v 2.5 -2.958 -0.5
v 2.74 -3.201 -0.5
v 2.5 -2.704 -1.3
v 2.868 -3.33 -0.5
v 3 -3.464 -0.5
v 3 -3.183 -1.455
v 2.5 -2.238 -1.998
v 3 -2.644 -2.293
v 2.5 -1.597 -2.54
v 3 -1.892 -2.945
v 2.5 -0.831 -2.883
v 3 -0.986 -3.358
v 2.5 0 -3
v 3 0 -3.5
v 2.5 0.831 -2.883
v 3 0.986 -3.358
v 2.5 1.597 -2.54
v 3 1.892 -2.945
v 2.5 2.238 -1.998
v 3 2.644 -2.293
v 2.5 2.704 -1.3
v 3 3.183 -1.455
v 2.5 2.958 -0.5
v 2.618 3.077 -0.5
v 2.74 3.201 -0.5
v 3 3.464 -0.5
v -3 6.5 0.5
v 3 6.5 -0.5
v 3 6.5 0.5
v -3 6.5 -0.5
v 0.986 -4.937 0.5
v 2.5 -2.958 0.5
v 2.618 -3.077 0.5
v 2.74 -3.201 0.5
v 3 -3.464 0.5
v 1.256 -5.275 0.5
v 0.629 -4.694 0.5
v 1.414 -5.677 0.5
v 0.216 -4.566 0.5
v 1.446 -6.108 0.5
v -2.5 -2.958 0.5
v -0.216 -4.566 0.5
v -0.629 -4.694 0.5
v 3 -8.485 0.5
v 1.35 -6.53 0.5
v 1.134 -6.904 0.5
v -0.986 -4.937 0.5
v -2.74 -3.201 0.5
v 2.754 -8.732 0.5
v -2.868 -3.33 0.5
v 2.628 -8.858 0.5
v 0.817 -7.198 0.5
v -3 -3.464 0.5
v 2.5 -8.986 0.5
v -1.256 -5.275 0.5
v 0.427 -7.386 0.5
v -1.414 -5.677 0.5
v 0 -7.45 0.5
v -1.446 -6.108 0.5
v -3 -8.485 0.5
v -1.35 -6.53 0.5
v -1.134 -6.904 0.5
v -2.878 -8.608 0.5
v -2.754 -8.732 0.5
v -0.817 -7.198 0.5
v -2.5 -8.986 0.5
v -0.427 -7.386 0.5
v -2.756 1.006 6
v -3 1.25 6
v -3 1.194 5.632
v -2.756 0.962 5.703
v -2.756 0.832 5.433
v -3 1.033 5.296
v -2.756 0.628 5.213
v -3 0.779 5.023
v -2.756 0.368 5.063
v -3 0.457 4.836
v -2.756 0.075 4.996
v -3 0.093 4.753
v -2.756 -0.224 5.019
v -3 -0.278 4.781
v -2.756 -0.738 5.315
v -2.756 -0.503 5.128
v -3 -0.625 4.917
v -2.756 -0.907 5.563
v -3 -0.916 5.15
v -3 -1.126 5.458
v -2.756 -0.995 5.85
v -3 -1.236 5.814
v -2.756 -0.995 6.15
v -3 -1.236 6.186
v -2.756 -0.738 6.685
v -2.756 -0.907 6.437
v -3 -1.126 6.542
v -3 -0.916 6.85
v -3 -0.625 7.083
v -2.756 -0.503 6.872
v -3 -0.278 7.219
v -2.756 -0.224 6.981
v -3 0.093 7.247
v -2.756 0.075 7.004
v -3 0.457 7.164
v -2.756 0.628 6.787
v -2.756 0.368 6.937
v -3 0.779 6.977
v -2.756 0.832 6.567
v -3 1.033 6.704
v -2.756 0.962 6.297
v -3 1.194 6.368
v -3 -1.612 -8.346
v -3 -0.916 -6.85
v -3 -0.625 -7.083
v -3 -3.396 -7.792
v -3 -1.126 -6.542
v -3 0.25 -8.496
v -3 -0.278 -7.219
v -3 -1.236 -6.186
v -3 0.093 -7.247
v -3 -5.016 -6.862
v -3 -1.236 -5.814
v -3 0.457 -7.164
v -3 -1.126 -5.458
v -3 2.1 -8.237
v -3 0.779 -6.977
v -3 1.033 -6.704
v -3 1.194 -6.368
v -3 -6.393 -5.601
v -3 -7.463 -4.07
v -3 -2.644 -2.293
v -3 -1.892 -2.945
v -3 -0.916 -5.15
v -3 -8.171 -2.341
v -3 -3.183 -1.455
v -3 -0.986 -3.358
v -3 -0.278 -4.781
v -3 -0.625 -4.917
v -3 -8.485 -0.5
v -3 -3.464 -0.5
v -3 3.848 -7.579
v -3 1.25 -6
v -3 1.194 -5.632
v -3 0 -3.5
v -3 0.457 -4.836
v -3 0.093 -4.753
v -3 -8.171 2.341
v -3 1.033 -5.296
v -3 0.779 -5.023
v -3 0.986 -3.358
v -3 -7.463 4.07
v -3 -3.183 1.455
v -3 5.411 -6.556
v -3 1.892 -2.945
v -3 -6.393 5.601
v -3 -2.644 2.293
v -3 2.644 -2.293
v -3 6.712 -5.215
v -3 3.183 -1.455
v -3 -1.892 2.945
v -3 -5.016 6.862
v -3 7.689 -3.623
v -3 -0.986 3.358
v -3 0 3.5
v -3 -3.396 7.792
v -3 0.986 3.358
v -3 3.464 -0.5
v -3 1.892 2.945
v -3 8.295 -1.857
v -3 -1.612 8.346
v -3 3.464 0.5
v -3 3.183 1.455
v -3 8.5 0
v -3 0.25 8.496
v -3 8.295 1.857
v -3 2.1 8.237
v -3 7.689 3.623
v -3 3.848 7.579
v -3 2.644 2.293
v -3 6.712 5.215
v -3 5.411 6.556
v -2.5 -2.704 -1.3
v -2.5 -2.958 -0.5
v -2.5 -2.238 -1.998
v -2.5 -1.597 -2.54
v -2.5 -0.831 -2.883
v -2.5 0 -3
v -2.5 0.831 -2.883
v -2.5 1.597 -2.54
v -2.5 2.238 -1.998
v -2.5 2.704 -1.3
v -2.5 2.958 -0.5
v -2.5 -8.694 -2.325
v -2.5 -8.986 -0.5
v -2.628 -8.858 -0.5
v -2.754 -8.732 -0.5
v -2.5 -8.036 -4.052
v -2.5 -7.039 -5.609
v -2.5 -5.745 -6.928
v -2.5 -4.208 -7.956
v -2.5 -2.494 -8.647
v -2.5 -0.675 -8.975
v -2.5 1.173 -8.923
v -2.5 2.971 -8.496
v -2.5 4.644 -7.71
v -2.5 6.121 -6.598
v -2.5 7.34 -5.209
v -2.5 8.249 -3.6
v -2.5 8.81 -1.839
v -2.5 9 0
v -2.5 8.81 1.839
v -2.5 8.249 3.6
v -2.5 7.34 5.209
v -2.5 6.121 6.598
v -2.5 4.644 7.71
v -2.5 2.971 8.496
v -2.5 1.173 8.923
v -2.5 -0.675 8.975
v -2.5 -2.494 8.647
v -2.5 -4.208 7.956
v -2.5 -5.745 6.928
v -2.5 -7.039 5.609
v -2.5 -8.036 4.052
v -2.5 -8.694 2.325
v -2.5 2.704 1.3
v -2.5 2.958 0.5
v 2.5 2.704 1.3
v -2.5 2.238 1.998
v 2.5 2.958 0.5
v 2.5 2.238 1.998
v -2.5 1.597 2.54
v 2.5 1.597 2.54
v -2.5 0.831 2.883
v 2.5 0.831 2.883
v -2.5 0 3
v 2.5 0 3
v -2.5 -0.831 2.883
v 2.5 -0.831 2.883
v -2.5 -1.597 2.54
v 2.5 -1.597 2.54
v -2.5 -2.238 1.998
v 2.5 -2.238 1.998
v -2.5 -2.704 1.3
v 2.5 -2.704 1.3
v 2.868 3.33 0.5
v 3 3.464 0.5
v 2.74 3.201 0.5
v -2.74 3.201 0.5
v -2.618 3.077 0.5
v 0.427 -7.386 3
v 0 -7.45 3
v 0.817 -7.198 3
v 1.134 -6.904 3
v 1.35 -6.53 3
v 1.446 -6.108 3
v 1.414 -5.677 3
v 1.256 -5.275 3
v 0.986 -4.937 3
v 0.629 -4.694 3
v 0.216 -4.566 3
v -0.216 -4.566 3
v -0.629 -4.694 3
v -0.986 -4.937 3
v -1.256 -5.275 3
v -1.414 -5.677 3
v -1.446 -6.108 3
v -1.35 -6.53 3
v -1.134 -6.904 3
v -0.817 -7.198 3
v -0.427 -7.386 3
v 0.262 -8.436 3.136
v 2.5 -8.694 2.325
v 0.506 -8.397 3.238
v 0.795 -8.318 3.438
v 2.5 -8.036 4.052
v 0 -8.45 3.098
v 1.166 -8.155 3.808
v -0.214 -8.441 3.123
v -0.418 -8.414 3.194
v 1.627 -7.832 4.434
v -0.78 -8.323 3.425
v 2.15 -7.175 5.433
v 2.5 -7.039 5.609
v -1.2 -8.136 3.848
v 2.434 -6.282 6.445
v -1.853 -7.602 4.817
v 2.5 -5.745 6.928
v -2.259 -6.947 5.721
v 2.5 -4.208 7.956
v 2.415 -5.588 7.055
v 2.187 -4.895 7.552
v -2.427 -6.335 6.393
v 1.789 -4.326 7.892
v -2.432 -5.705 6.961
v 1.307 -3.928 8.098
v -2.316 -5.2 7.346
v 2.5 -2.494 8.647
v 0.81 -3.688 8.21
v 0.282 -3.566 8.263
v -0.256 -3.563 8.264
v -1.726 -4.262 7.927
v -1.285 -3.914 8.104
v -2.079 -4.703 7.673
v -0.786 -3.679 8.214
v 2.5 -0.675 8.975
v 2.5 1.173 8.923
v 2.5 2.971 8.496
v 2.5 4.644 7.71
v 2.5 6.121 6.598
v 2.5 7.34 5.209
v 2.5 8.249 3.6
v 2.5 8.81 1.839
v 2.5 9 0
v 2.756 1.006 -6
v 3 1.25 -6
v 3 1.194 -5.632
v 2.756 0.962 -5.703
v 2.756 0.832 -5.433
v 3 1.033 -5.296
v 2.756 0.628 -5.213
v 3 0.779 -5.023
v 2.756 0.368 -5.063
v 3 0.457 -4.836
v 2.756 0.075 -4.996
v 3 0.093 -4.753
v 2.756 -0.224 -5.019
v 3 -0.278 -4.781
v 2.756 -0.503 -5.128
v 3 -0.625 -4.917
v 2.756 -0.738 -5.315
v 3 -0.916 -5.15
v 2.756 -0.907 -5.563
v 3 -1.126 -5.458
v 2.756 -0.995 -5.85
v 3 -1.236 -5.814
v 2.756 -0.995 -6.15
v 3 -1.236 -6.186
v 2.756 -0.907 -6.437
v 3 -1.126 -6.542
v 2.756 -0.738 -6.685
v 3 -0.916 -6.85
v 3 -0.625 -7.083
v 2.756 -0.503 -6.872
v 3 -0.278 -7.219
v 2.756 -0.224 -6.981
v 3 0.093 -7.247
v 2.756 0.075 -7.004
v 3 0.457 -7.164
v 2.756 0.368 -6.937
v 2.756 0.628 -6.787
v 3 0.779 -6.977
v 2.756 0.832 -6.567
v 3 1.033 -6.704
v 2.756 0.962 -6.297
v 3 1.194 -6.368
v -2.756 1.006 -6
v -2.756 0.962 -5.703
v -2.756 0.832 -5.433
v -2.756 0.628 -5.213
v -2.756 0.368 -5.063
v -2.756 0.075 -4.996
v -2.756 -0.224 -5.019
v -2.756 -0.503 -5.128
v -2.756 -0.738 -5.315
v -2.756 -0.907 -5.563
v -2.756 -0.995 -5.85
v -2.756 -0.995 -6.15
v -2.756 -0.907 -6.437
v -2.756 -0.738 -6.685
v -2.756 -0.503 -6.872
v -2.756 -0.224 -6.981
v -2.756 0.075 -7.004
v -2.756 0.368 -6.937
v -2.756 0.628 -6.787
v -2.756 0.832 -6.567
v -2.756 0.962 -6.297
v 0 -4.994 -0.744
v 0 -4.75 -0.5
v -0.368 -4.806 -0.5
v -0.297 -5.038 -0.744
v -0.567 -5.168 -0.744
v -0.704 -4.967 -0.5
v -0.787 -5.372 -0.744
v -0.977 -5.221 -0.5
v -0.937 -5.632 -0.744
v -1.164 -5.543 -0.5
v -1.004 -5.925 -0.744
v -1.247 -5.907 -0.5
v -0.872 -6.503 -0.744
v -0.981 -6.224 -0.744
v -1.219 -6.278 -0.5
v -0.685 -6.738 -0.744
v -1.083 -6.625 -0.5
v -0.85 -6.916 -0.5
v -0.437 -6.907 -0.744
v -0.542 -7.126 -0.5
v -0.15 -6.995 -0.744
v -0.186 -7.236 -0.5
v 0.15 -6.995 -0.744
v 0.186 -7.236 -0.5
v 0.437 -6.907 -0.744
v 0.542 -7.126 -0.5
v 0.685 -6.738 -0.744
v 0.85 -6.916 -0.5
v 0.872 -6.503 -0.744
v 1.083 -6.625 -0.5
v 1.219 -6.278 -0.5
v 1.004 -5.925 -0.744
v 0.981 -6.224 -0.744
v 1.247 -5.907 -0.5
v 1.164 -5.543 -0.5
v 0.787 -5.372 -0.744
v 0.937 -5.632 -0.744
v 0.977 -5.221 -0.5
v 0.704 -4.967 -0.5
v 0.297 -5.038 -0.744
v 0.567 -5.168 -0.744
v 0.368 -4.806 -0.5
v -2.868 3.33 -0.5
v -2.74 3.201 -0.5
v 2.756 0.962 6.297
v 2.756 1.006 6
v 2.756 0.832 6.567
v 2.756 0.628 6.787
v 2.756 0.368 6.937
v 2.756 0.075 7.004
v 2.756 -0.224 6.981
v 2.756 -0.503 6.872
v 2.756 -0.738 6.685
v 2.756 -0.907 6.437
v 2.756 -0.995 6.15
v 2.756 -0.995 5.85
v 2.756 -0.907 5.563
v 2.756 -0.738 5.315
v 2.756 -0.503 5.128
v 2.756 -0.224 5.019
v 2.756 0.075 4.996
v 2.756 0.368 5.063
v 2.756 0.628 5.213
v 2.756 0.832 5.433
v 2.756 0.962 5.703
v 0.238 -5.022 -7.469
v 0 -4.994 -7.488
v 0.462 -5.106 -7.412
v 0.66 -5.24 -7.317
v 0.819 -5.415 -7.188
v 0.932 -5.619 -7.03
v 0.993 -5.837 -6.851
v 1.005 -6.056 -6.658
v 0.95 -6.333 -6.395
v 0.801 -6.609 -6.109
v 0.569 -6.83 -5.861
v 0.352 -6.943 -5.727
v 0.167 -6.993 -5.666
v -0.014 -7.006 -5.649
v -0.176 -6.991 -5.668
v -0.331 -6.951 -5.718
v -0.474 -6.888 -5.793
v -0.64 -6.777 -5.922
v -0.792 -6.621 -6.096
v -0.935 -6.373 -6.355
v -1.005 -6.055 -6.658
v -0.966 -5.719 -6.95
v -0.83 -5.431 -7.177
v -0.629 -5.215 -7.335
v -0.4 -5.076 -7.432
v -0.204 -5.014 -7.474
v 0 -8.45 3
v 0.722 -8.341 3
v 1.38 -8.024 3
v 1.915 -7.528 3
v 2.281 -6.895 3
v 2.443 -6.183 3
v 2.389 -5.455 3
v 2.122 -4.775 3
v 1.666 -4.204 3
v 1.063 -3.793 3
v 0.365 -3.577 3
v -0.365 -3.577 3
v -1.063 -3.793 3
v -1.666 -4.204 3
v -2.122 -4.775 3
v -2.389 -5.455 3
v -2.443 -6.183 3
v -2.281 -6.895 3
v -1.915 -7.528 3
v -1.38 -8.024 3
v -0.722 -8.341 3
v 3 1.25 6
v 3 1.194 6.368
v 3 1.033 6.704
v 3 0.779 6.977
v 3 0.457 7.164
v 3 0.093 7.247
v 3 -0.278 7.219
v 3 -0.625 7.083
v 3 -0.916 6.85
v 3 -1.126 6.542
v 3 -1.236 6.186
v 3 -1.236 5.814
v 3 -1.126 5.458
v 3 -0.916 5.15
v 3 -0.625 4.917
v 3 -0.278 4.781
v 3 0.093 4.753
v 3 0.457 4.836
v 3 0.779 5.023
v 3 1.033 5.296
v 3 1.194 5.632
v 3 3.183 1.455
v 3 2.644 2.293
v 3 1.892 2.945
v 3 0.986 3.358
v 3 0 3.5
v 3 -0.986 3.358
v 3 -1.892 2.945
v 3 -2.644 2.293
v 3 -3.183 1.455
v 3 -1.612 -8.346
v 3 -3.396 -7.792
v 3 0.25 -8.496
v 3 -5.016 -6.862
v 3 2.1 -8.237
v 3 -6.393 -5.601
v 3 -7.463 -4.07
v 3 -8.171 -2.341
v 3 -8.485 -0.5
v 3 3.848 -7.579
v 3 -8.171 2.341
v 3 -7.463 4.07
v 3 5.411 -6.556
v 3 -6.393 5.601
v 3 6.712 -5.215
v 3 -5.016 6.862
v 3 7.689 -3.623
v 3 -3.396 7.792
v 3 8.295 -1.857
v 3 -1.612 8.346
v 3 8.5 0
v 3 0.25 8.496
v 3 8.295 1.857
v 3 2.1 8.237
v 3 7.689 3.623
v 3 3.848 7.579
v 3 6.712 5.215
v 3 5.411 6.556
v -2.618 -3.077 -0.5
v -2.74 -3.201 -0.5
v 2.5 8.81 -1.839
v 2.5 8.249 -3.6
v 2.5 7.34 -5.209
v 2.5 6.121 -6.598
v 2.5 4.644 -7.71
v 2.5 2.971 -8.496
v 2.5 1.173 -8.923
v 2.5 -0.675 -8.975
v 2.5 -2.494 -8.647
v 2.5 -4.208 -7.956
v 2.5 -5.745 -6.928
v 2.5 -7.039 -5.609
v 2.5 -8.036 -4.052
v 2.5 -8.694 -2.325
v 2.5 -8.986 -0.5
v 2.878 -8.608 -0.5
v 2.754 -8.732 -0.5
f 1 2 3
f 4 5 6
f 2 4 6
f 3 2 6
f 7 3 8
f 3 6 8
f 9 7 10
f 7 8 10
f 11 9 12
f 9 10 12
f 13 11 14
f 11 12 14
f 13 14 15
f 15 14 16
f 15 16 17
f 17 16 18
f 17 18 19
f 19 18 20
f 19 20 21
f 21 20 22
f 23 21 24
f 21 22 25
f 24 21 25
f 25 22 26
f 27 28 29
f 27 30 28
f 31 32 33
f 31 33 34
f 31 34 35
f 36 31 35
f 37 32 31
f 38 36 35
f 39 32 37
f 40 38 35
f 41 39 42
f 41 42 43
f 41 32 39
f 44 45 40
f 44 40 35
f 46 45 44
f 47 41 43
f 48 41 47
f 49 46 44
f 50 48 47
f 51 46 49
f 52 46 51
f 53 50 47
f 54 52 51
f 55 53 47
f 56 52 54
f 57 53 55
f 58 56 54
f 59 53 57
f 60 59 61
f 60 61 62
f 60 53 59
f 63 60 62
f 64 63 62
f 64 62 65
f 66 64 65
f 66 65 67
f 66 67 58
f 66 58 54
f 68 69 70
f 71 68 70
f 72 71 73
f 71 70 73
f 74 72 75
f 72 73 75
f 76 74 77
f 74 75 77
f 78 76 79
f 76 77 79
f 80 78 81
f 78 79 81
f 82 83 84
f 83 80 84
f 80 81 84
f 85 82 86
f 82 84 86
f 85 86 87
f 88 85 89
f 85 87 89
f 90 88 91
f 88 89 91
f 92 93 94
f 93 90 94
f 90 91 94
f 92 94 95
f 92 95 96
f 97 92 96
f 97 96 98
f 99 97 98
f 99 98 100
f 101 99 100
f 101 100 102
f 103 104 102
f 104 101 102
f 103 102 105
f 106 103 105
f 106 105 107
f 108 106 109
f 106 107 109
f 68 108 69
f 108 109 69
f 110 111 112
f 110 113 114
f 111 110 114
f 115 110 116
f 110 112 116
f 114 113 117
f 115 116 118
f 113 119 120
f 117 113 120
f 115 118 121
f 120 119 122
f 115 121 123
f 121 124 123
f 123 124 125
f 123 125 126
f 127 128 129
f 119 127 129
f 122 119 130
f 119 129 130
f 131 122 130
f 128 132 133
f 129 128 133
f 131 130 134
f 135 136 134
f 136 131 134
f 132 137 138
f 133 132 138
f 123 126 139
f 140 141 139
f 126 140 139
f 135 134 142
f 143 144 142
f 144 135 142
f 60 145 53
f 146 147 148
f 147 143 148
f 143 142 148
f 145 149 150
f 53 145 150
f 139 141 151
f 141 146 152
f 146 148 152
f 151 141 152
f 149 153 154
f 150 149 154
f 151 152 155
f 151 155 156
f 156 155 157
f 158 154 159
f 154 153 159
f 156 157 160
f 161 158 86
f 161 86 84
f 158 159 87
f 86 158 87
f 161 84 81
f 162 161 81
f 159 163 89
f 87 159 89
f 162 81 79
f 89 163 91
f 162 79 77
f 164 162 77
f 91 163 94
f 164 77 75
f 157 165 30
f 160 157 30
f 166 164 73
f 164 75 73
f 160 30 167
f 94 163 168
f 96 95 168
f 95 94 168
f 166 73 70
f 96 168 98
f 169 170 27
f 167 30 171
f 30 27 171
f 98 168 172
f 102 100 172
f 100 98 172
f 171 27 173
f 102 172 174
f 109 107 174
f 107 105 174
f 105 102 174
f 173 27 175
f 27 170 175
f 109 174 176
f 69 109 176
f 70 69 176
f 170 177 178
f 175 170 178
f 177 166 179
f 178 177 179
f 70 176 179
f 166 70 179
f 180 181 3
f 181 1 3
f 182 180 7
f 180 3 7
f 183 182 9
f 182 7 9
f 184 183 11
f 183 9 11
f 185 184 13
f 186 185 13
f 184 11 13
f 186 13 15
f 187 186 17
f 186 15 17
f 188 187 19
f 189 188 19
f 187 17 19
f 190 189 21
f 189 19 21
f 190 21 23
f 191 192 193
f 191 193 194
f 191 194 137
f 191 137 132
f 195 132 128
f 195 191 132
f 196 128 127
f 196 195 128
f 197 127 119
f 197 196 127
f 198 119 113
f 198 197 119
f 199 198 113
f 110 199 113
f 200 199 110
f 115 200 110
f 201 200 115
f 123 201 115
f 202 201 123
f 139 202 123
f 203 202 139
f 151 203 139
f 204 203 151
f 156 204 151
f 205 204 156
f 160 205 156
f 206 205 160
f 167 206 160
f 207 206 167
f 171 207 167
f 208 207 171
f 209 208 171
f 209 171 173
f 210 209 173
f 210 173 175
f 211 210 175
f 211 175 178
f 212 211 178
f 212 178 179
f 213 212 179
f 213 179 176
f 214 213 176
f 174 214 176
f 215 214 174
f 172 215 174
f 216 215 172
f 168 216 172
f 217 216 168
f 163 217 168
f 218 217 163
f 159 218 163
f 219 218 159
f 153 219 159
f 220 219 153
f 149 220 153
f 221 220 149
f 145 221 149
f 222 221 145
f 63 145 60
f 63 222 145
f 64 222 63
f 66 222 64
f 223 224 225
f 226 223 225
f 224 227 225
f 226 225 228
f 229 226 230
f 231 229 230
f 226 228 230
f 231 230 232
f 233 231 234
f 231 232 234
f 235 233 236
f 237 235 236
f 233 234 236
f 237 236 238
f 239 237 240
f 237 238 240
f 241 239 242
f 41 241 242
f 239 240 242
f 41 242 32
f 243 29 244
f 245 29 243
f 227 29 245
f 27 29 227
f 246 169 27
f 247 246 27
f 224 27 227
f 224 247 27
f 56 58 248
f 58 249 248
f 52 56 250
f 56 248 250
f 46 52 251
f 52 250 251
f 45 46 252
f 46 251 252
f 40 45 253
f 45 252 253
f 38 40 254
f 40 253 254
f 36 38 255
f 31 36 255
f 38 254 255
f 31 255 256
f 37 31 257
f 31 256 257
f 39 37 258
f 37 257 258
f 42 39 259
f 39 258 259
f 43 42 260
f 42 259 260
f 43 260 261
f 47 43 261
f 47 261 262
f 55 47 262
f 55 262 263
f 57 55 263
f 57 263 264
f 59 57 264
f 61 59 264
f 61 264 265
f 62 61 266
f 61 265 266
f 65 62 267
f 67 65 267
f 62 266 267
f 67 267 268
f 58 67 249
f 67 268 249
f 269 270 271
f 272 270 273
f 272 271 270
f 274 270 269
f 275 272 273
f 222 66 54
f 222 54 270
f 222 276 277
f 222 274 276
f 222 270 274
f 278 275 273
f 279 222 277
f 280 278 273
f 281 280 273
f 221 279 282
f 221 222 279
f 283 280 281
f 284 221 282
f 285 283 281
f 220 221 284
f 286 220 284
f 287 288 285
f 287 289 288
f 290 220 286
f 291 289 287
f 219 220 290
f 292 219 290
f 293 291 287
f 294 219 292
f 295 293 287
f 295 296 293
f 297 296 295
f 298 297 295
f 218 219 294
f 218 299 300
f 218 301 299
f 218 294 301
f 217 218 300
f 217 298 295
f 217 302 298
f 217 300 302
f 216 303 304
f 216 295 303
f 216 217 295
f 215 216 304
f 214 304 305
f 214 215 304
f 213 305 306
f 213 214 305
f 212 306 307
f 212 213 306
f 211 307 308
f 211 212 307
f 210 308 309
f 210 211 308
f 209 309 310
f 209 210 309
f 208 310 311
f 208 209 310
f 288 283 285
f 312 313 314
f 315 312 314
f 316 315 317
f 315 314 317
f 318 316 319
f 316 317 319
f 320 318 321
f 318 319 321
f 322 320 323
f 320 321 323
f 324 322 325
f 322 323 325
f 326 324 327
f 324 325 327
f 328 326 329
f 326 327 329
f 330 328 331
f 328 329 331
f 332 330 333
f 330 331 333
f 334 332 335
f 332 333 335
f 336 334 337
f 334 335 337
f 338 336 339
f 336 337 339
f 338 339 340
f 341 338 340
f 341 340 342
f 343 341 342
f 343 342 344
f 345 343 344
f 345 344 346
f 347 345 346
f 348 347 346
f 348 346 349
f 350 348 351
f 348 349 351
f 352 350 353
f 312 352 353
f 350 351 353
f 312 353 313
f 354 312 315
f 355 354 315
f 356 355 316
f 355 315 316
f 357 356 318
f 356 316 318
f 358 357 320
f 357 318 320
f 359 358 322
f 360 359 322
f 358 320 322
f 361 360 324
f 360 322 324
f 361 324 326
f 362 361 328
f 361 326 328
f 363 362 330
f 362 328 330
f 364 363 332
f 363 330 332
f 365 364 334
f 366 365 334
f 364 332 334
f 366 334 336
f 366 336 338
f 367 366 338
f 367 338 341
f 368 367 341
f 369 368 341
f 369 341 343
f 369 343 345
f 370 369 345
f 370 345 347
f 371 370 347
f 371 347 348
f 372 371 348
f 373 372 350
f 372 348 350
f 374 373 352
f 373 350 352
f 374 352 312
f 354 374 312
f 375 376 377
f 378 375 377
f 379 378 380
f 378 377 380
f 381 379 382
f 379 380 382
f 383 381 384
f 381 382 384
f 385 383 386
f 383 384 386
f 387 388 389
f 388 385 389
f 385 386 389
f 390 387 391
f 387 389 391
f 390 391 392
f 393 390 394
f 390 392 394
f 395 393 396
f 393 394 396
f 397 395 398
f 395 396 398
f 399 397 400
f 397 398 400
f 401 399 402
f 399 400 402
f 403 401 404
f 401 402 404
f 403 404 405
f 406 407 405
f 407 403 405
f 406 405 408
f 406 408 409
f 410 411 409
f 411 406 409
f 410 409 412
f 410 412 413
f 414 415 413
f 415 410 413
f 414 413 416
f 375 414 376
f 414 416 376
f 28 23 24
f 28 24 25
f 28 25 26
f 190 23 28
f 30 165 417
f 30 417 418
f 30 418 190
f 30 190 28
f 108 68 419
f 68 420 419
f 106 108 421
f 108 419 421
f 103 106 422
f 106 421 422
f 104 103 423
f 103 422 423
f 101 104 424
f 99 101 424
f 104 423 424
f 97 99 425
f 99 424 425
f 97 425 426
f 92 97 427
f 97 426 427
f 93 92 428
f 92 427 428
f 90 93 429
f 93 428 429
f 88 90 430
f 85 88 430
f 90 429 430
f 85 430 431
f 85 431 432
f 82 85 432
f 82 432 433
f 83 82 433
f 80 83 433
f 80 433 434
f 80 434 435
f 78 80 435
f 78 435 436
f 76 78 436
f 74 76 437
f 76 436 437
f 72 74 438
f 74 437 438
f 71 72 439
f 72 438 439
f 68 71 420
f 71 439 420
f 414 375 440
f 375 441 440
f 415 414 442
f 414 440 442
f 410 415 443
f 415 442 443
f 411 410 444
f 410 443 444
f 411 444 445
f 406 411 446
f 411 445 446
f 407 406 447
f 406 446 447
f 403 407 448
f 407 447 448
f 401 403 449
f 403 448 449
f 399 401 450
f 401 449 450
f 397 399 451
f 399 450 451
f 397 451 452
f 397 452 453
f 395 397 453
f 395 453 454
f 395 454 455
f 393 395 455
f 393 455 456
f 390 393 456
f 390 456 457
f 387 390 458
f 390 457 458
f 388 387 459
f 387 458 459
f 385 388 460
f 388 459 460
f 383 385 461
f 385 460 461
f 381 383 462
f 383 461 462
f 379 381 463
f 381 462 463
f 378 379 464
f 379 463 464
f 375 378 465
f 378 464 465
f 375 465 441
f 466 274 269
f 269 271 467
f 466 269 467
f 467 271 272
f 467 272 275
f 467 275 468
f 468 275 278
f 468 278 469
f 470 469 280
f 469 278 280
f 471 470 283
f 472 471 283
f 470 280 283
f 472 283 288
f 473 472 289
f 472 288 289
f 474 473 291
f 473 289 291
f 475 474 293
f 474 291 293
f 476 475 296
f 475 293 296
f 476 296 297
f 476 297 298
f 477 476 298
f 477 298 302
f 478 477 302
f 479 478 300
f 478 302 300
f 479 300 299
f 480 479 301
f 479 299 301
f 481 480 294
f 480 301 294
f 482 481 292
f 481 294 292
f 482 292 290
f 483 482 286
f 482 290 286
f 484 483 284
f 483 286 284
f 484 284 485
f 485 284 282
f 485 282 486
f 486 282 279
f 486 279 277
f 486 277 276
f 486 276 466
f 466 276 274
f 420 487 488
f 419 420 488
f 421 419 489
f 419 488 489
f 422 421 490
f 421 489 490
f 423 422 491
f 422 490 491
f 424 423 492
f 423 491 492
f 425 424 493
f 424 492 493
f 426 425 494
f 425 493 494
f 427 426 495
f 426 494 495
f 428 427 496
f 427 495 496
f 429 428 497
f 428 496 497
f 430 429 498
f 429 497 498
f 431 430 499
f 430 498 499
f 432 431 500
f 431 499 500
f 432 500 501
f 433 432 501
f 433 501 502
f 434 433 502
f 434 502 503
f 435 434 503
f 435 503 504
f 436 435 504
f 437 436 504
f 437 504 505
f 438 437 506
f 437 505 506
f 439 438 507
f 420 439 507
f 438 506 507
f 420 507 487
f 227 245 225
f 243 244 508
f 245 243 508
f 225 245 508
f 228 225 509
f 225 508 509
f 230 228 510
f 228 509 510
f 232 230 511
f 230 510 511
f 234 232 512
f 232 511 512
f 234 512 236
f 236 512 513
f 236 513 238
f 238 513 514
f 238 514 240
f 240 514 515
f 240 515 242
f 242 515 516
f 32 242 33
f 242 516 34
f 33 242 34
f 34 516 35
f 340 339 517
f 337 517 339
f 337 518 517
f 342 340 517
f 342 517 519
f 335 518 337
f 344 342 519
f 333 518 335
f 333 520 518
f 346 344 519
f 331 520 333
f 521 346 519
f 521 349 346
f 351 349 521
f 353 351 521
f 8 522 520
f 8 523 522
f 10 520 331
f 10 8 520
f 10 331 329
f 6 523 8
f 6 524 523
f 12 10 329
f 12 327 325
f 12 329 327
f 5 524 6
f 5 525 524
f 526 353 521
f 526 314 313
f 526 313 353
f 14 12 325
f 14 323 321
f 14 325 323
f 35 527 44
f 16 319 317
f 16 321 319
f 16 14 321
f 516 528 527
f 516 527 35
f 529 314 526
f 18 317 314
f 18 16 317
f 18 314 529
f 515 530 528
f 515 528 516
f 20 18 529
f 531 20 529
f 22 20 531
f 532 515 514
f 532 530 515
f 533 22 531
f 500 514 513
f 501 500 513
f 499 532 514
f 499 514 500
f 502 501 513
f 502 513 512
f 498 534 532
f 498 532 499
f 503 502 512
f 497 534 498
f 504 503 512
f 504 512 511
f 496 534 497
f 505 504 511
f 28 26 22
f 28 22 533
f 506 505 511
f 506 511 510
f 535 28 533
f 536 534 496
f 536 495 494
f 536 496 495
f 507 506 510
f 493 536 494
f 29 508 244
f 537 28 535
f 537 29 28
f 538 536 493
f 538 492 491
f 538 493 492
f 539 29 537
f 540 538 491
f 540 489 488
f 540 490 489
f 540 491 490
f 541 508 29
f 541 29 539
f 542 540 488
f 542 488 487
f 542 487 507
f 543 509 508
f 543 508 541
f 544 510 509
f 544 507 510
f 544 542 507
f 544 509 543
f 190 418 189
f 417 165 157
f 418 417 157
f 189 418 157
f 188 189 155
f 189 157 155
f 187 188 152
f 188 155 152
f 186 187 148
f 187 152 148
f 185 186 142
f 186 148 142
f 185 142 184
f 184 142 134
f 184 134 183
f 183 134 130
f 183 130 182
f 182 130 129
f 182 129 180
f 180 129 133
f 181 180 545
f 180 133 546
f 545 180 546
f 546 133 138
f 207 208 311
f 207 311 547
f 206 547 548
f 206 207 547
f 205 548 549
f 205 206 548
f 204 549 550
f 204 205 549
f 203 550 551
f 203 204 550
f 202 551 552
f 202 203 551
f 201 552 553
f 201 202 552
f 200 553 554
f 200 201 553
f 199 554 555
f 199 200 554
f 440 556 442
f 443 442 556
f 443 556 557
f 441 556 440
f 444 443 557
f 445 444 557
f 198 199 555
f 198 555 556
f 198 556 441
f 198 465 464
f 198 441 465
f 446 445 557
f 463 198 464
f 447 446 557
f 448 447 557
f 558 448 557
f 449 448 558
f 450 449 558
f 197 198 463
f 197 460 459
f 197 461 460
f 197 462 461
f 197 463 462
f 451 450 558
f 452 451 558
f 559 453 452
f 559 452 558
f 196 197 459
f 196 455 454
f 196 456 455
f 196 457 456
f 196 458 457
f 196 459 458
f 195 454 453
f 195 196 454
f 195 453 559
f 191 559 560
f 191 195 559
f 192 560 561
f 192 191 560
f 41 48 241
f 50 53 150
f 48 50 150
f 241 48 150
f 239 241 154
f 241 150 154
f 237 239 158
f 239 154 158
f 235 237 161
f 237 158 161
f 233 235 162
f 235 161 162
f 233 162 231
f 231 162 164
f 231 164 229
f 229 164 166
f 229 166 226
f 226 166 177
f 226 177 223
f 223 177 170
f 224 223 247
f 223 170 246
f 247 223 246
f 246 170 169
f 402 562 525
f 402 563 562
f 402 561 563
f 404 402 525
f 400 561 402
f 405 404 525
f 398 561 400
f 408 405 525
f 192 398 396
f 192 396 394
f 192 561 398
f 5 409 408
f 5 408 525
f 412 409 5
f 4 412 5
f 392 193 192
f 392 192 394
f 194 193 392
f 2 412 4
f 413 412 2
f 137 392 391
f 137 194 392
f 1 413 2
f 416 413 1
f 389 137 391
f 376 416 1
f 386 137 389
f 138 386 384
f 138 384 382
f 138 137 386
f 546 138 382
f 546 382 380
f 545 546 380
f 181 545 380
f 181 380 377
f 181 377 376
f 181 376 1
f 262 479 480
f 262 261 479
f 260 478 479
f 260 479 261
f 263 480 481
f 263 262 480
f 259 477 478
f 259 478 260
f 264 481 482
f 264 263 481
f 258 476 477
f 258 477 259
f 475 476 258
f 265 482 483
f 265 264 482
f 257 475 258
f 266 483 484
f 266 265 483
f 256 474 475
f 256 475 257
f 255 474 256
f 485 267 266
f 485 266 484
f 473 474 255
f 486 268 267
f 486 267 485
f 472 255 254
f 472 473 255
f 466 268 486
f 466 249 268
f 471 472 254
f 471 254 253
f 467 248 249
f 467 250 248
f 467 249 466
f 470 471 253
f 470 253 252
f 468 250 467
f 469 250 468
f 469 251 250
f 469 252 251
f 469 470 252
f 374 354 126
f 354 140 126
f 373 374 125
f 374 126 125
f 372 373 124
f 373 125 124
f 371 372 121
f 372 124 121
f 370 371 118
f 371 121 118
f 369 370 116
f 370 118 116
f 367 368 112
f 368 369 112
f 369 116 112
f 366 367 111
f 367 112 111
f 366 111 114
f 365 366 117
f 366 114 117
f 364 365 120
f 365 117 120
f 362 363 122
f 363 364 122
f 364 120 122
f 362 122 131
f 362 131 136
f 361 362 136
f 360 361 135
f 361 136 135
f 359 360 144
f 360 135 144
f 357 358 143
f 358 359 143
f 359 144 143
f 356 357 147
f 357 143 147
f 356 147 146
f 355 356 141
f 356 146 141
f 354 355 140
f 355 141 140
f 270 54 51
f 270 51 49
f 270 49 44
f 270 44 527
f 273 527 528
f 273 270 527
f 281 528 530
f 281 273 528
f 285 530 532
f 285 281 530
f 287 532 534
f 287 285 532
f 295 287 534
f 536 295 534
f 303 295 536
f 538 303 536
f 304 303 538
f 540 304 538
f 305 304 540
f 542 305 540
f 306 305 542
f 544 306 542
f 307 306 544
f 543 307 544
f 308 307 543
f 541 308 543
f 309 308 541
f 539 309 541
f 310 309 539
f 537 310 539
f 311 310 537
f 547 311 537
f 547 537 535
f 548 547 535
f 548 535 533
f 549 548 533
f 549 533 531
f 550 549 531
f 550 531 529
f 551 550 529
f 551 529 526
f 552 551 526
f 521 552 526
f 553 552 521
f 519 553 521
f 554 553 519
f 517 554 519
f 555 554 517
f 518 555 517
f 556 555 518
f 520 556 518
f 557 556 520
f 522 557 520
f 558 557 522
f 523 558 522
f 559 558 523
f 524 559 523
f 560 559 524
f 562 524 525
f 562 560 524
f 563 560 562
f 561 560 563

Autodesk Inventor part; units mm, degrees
sketch "Sketch_1" plane through (0, 0, 0) normal (0, 0, 1) x (1, 0, 0)
  line L0 (3, 0) -> (-3, 0)
  line L1 (-3, 8.5) -> (-3, 3.5)
  line L2 (-3, 3.5) -> (-2.5, 3)
  line L3 (-2.5, 3) -> (2.5, 3)
  line L4 (2.5, 3) -> (3, 3.5)
  line L5 (3, 3.5) -> (3, 8.5)
  line L6 (3, 8.5) -> (2.5, 9)
  line L7 (2.5, 9) -> (-2.5, 9)
  line L8 (-2.5, 9) -> (-3, 8.5)
revolve "Revolution1" add sketch "Sketch_1" angle 360 about axis through (3, 0, 0) along (1, 0, 0)
sketch "Sketch_2" plane through (0, 0, 0) normal (1, 0, 0) x (0, 1, 0)
  line L0 (-9, 0.5) -> (-9, -0.5)
  line L1 (-9, -0.5) -> (6.5, -0.5)
  line L2 (6.5, -0.5) -> (6.5, 0.5)
  line L3 (6.5, 0.5) -> (-9, 0.5)
extrude "Extrusion1" cut sketch "Sketch_2" along normal mid plane 6
sketch "Sketch_3" plane through (0, 0, 0) normal (1, 0, 0) x (0, 1, 0)
  line L0 (-6, 9) -> (-6, 0)
  line L1 (-6, 0) -> (-7.45, 0)
  line L2 (-7.45, 0) -> (-7.45, 3)
  line L3 (-7.45, 3) -> (-8.45, 3)
  line L4 (-8.45, 3) -> (-8.45, 9)
  line L5 (-8.45, 9) -> (-6, 9)
  line L6 (-6, 9) -> (-6, 0)
revolve "Revolution2" cut sketch "Sketch_3" angle 360 about axis through (0, -6, 9) along (0, 0, 1)
sketch "Sketch_4" plane through (0, 0, 0) normal (1, 0, 0) x (0, 1, 0)
  line L0 (-6, -9.5) -> (-6, -0.5)
  line L1 (-6, -0.5) -> (-4.75, -0.5)
  line L2 (-4.75, -0.5) -> (-4.9935, -0.7435)
  line L3 (-4.9935, -0.7435) -> (-4.9935, -9.5)
  line L4 (-4.9935, -9.5) -> (-6, -9.5)
  line L5 (-6, -9.5) -> (-6, -0.5)
revolve "Revolution3" cut sketch "Sketch_4" angle 360 about axis through (0, -6, -9.5) along (0, 0, -1)
thread "Thread1" size "M2.5x0.45" class "6H" standard "ISO Metric profile" length 6.9009
sketch "Sketch_7" plane through (0, 0, -6) normal (0, 0, 1) x (1, 0, 0)
  line L0 (3, 0) -> (-3, 0)
  line L1 (-3, 0) -> (-3, 1.25)
  line L2 (-3, 1.25) -> (-2.7565, 1.0065)
  line L3 (-2.7565, 1.0065) -> (2.7565, 1.0065)
  line L4 (2.7565, 1.0065) -> (3, 1.25)
  line L5 (3, 1.25) -> (3, 0)
  line L6 (3, 0) -> (-3, 0)
revolve "Revolution4" cut sketch "Sketch_7" angle 360 about axis through (3, 0, -6) along (1, 0, 0)
thread "Thread2" size "M2.5x0.45" class "6H" standard "ISO Metric profile" full length
sketch "Sketch_8" plane through (0, 0, 6) normal (0, 0, 1) x (1, 0, 0)
  line L0 (3, 0) -> (-3, 0)
  line L1 (-3, 0) -> (-3, 1.25)
  line L2 (-3, 1.25) -> (-2.7565, 1.0065)
  line L3 (-2.7565, 1.0065) -> (2.7565, 1.0065)
  line L4 (2.7565, 1.0065) -> (3, 1.25)
  line L5 (3, 1.25) -> (3, 0)
  line L6 (3, 0) -> (-3, 0)
revolve "Revolution5" cut sketch "Sketch_8" angle 360 about axis through (3, 0, 6) along (1, 0, 0)
thread "Thread3" size "M2.5x0.45" class "6H" standard "ISO Metric profile" full length
ref_plane "body_screw_XY" through (0, -6, 3) normal (0, 0, 1) x (1, 0, 0)
ref_plane "body_screw_YZ" through (0, -6, 3) normal (1, 0, 0) x (0, 1, 0)
ref_plane "body_screw_ZX" through (0, -6, 3) normal (0, 1, 0) x (0, 0, 1)
properties part number "SCSWJ6-6_b"
